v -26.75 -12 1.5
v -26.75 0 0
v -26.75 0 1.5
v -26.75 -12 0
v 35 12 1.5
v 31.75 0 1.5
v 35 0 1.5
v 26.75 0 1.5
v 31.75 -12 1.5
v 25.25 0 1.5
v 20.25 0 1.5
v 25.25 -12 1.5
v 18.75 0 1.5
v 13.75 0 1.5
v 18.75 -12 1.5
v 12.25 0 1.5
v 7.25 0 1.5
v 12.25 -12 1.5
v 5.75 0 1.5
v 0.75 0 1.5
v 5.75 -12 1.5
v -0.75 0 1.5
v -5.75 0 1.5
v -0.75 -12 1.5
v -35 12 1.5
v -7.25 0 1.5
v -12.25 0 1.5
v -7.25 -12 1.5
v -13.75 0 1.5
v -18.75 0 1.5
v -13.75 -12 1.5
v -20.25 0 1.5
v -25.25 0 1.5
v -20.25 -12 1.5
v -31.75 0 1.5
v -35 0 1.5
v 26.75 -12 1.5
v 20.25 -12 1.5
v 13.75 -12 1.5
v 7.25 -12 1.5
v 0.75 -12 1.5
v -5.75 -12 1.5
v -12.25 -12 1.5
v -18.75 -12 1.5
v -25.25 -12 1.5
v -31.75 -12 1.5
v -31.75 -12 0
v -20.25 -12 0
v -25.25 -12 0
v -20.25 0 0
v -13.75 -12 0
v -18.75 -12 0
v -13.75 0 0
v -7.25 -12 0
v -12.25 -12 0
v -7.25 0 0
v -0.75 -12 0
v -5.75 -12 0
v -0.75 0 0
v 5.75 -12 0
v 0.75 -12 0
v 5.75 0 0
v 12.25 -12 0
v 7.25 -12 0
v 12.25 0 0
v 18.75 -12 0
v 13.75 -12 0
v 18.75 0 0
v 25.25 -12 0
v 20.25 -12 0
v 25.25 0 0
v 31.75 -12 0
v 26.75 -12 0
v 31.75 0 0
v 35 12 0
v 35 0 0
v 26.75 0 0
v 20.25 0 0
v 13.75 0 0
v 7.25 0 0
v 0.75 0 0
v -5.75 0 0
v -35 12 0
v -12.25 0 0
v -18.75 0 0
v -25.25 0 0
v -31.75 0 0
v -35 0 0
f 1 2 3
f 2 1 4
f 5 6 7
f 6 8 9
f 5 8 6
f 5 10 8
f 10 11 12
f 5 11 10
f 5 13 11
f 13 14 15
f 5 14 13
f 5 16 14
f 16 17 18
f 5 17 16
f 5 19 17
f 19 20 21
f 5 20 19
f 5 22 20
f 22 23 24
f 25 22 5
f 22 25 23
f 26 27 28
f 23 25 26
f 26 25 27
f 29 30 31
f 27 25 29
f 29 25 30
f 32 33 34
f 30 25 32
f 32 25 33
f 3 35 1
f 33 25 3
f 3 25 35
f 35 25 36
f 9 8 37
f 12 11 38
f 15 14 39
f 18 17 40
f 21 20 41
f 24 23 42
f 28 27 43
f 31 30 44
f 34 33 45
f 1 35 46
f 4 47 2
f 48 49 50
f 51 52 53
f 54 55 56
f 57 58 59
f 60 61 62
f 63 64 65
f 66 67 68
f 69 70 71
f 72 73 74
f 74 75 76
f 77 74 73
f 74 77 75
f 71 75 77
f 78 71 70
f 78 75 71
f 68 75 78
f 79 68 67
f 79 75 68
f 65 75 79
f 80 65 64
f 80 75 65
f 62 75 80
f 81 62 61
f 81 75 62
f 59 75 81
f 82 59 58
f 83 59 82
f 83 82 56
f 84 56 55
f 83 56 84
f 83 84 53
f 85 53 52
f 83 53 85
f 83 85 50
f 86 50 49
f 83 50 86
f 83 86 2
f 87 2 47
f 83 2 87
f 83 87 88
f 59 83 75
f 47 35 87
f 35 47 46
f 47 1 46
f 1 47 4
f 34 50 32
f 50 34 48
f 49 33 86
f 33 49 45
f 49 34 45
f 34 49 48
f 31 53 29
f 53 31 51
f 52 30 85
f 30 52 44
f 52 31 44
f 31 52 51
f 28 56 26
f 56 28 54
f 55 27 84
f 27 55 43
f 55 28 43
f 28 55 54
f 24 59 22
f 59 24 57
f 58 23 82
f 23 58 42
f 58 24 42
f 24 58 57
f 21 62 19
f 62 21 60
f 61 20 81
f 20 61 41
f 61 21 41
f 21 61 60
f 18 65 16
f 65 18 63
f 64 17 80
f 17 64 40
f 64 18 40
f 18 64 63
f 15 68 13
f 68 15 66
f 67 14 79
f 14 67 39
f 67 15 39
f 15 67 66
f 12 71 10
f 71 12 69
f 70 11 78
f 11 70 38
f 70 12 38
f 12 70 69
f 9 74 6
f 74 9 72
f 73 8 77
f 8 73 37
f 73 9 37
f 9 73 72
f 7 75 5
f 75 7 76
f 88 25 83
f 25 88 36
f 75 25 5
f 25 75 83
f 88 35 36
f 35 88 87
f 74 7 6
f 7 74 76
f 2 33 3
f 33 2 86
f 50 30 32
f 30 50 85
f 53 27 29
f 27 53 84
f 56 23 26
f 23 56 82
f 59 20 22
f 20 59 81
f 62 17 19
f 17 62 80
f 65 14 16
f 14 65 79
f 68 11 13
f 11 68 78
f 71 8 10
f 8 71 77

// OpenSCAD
// 10-well agarose gel comb - printed flat on the bed
// Units: mm

$fn = 64;

// ---- Parameters ----
plate_t      = 1.5;   // plate thickness (Z)
spine_len    = 70;    // spine length (X)
spine_w      = 12;    // spine width (Y)
n_teeth      = 10;    // number of teeth / wells
tooth_w      = 5.0;   // tooth width (X)
tooth_len    = 12;    // tooth length (Y), hanging in -Y
tooth_gap    = 1.5;   // gap between neighbouring teeth (X)
overlap      = 0.01;  // small overlap so teeth fuse into spine

// ---- Derived ----
total_y     = spine_w + tooth_len;                          // overall Y extent
row_w       = n_teeth * tooth_w + (n_teeth - 1) * tooth_gap; // teeth row width
spine_y0    = -total_y / 2 + tooth_len;                     // spine bottom edge (Y)
teeth_y0    = -total_y / 2;                                 // teeth tip edge (Y)
pitch       = tooth_w + tooth_gap;                          // tooth centre spacing

// ---- Model ----
union() {
    // Spine (back bar)
    translate([-spine_len / 2, spine_y0, 0])
        cube([spine_len, spine_w, plate_t]);

    // Teeth, centred on spine in X
    for (i = [0 : n_teeth - 1])
        translate([-row_w / 2 + i * pitch, teeth_y0, 0])
            cube([tooth_w, tooth_len + overlap, plate_t]);
}
